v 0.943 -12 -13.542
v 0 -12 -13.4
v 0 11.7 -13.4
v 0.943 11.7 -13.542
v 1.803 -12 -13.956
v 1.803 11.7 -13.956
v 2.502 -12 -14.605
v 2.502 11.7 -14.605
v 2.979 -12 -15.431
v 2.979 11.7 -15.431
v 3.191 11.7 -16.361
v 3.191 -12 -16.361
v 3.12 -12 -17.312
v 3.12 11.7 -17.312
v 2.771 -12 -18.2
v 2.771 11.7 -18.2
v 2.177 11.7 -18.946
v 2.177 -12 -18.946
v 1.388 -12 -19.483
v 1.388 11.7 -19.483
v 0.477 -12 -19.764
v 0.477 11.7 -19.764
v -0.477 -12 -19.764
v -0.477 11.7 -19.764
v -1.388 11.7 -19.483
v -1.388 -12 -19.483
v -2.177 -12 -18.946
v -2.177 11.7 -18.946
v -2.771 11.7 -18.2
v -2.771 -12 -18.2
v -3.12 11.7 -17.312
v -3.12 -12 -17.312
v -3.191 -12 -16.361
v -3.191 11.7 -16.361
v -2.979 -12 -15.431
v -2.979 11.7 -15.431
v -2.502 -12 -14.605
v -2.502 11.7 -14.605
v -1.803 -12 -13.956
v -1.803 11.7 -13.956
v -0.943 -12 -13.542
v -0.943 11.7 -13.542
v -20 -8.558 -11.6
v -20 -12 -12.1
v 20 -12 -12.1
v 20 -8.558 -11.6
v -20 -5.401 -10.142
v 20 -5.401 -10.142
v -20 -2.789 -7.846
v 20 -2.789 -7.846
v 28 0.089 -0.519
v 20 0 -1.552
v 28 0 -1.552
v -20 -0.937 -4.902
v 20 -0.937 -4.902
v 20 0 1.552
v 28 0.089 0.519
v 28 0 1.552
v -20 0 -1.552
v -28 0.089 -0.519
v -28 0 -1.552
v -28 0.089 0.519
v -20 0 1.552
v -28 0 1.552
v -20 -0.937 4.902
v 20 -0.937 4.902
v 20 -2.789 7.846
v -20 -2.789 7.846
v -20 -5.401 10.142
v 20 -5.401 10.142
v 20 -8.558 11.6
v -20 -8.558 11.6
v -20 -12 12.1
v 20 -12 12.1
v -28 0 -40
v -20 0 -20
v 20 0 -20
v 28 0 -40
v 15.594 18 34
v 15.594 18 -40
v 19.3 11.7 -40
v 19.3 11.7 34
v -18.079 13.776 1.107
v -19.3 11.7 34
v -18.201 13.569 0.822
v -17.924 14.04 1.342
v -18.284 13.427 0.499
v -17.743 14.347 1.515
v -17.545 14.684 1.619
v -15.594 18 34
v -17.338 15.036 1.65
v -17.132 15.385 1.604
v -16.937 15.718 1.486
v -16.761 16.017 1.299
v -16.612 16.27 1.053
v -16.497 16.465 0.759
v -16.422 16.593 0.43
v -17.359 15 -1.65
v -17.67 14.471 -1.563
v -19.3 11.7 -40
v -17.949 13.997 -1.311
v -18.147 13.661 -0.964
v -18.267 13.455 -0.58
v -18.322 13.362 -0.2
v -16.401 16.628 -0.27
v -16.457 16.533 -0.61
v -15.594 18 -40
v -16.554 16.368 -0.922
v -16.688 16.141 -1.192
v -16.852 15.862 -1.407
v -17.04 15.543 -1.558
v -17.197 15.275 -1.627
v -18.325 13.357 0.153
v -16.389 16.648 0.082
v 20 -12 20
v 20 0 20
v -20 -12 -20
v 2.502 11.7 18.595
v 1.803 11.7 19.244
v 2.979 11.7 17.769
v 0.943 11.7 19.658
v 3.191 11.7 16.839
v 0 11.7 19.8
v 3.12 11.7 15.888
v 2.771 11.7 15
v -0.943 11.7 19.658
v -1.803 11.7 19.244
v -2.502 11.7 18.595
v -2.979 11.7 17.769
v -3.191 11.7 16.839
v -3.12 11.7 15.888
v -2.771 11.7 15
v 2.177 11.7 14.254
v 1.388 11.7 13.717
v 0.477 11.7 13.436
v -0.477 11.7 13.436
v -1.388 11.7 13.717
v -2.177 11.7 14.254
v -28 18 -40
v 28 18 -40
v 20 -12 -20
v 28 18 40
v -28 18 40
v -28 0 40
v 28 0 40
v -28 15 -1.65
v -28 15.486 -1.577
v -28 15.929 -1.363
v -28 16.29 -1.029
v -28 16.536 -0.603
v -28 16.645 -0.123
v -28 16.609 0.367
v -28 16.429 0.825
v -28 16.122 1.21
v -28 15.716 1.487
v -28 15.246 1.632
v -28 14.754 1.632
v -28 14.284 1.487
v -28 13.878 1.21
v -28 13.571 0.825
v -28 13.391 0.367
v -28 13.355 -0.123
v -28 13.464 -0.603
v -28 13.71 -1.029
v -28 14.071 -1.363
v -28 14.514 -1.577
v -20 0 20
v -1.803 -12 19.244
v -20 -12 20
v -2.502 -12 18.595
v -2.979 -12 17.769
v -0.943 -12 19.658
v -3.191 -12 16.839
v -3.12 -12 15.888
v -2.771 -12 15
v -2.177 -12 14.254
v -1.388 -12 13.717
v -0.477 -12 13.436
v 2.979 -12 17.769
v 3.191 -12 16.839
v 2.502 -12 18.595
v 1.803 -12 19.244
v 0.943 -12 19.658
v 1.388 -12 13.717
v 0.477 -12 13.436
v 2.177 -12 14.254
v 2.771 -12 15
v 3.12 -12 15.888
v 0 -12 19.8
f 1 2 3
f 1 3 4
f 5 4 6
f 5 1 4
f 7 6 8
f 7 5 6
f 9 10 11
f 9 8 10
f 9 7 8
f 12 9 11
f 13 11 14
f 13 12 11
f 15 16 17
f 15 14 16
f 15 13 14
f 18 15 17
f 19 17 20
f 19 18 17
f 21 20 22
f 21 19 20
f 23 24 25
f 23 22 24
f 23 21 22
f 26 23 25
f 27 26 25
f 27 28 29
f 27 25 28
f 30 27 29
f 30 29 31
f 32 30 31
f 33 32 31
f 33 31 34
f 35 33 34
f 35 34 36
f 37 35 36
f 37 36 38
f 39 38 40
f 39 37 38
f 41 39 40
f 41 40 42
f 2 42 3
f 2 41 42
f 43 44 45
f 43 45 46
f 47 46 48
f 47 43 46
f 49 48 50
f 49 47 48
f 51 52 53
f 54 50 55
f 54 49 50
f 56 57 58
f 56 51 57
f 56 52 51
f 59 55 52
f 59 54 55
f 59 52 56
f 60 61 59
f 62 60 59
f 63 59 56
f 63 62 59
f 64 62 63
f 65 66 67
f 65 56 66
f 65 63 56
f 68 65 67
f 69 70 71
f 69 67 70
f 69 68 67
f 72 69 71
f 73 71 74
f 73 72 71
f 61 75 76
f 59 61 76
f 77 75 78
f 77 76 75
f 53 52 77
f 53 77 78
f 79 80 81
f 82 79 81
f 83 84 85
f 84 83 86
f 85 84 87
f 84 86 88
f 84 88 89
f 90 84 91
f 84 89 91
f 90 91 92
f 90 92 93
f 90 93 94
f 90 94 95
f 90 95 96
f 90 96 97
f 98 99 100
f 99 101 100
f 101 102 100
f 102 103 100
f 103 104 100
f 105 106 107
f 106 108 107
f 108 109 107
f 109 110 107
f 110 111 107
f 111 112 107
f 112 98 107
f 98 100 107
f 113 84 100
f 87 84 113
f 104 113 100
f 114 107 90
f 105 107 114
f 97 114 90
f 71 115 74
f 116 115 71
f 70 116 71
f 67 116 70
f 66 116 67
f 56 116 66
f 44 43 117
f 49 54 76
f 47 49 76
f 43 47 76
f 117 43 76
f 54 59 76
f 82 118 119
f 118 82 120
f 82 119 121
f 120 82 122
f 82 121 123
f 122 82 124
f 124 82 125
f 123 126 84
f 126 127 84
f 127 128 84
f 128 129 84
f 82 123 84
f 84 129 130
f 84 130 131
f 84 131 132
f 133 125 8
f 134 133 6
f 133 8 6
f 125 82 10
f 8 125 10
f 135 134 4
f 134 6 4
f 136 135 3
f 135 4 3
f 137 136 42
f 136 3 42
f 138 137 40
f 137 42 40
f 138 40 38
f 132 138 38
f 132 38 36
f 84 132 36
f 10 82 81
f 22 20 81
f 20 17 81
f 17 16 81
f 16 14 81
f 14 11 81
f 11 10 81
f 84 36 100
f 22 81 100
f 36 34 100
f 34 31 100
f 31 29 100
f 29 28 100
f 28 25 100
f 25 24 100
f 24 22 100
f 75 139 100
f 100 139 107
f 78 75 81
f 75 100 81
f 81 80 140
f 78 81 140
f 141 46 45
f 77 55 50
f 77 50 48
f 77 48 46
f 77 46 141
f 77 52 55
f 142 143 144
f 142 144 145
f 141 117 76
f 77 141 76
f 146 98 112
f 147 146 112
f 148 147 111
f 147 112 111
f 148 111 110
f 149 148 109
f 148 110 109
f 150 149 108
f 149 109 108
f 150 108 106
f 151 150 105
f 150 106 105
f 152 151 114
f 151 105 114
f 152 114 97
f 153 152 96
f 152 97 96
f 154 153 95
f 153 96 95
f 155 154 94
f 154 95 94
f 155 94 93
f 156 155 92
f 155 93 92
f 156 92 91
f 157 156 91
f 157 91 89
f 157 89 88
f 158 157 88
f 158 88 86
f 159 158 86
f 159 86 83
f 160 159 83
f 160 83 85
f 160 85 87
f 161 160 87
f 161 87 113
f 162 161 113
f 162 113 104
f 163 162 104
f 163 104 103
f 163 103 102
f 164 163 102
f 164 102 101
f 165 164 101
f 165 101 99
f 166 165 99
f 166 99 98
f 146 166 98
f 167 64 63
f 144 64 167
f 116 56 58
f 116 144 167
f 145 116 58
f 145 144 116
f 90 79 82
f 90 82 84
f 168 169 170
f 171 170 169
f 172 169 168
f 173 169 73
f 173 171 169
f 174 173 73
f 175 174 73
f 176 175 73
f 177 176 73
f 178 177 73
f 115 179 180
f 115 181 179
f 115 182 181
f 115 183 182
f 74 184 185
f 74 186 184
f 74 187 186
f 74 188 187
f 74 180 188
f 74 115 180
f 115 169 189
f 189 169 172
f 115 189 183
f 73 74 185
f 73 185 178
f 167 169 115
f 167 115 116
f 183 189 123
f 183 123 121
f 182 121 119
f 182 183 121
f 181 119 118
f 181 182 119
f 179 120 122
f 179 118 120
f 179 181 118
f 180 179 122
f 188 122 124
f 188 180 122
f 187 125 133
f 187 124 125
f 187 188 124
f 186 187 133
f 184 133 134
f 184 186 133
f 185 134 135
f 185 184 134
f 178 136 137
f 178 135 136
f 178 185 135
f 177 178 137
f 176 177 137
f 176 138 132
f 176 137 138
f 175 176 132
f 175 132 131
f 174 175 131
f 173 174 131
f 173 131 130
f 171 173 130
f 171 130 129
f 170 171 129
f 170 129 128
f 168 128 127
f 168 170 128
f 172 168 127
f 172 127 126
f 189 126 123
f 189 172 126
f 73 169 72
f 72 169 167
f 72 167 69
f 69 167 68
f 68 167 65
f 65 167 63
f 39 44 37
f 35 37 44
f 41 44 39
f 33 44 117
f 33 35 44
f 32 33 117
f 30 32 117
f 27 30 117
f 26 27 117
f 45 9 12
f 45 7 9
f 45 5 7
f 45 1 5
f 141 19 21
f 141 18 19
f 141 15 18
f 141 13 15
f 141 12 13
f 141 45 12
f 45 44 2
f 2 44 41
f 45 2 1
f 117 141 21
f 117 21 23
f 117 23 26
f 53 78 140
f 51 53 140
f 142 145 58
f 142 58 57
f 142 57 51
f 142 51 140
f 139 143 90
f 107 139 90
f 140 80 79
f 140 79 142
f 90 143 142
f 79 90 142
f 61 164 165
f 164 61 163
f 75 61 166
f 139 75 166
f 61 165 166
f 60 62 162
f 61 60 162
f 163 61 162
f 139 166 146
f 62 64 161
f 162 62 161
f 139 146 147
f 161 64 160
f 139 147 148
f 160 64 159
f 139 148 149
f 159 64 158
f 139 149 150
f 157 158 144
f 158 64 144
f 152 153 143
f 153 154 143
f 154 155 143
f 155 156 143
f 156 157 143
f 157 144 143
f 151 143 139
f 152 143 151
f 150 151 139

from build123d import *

# Parameters (mm, degrees)
SKETCH1_W                   = 56
SKETCH1_H                   = 18
CHANNEL_BLOCK_DEPTH         = 40
SKETCH2_W                   = 40
SKETCH2_H                   = 12.5
CLAMP_UPPER_HALF_DEPTH      = 20
DOVETAIL_CHANNEL_DEPTH      = 34
DOVETAIL_CHANNEL_DEPTH_BACK = 41
HANDLEBAR_BORE_DEPTH        = 53.038447325
HANDLEBAR_BORE_DEPTH_BACK   = 53.038447325
SKETCH4_R                   = 12.1
M5_INSERT_HOLES_DEPTH       = 53.038447325
M5_INSERT_HOLES_DEPTH_BACK  = 53.038447325
SKETCH5_R                   = 3.2
SKETCH6_R                   = 1.65
LOCK_SCREW_HOLE_DEPTH       = 53.038447325


with BuildPart() as part:
    # Sketch1 → Channel Block (new, symmetric)
    with BuildSketch(Plane.XY):
        with Locations((0, 9)):
            Rectangle(SKETCH1_W, SKETCH1_H)
    extrude(amount=CHANNEL_BLOCK_DEPTH, both=True)

    # Sketch2 → Clamp Upper Half (add, symmetric)
    with BuildSketch(Plane(origin=(0, 0, 0), x_dir=(0, 0, -1), z_dir=(1, 0, 0))):
        with Locations((0, -5.75)):
            Rectangle(SKETCH2_W, SKETCH2_H)
    extrude(amount=CLAMP_UPPER_HALF_DEPTH, both=True)

    # Sketch3 → Dovetail Channel (cut, two sides: drawn at the far end of the back side and taken through both)
    with BuildSketch(Plane.XY.offset(-DOVETAIL_CHANNEL_DEPTH_BACK)):
        Polygon((-15.3, 18.5), (15.3, 18.5), (19.3, 11.7), (-19.3, 11.7), align=None)
    extrude(amount=DOVETAIL_CHANNEL_DEPTH + DOVETAIL_CHANNEL_DEPTH_BACK, mode=Mode.SUBTRACT)

    # Sketch4 → Handlebar Bore (cut, two sides: drawn at the far end of the back side and taken through both)
    with BuildSketch(Plane(origin=(0, 0, 0), x_dir=(0, 0, -1), z_dir=(1, 0, 0)).offset(-HANDLEBAR_BORE_DEPTH_BACK)):
        with Locations((0, -12)):
            Circle(SKETCH4_R)
    extrude(amount=HANDLEBAR_BORE_DEPTH + HANDLEBAR_BORE_DEPTH_BACK, mode=Mode.SUBTRACT)

    # Sketch5 → M5 Insert Holes (cut, two sides: drawn at the far end of the back side and taken through both)
    with BuildSketch(Plane(origin=(0, 0, 0), x_dir=(1, 0, 0), z_dir=(0, 1, 0)).offset(-M5_INSERT_HOLES_DEPTH_BACK)):
        with Locations(Location((0, -16.6, 0), (0, 0, 270))):
            Circle(SKETCH5_R)
        with Locations(Location((0, 16.6, 0), (0, 0, 270))):
            Circle(SKETCH5_R)
    extrude(amount=M5_INSERT_HOLES_DEPTH + M5_INSERT_HOLES_DEPTH_BACK, mode=Mode.SUBTRACT)

    # Sketch6 → Lock Screw Hole (cut, through all)
    with BuildSketch(Plane(origin=(0, 0, 0), x_dir=(0, 0, -1), z_dir=(1, 0, 0))):
        with Locations((0, 15)):
            Circle(SKETCH6_R)
    extrude(amount=-LOCK_SCREW_HOLE_DEPTH, mode=Mode.SUBTRACT)


solid = part.part
